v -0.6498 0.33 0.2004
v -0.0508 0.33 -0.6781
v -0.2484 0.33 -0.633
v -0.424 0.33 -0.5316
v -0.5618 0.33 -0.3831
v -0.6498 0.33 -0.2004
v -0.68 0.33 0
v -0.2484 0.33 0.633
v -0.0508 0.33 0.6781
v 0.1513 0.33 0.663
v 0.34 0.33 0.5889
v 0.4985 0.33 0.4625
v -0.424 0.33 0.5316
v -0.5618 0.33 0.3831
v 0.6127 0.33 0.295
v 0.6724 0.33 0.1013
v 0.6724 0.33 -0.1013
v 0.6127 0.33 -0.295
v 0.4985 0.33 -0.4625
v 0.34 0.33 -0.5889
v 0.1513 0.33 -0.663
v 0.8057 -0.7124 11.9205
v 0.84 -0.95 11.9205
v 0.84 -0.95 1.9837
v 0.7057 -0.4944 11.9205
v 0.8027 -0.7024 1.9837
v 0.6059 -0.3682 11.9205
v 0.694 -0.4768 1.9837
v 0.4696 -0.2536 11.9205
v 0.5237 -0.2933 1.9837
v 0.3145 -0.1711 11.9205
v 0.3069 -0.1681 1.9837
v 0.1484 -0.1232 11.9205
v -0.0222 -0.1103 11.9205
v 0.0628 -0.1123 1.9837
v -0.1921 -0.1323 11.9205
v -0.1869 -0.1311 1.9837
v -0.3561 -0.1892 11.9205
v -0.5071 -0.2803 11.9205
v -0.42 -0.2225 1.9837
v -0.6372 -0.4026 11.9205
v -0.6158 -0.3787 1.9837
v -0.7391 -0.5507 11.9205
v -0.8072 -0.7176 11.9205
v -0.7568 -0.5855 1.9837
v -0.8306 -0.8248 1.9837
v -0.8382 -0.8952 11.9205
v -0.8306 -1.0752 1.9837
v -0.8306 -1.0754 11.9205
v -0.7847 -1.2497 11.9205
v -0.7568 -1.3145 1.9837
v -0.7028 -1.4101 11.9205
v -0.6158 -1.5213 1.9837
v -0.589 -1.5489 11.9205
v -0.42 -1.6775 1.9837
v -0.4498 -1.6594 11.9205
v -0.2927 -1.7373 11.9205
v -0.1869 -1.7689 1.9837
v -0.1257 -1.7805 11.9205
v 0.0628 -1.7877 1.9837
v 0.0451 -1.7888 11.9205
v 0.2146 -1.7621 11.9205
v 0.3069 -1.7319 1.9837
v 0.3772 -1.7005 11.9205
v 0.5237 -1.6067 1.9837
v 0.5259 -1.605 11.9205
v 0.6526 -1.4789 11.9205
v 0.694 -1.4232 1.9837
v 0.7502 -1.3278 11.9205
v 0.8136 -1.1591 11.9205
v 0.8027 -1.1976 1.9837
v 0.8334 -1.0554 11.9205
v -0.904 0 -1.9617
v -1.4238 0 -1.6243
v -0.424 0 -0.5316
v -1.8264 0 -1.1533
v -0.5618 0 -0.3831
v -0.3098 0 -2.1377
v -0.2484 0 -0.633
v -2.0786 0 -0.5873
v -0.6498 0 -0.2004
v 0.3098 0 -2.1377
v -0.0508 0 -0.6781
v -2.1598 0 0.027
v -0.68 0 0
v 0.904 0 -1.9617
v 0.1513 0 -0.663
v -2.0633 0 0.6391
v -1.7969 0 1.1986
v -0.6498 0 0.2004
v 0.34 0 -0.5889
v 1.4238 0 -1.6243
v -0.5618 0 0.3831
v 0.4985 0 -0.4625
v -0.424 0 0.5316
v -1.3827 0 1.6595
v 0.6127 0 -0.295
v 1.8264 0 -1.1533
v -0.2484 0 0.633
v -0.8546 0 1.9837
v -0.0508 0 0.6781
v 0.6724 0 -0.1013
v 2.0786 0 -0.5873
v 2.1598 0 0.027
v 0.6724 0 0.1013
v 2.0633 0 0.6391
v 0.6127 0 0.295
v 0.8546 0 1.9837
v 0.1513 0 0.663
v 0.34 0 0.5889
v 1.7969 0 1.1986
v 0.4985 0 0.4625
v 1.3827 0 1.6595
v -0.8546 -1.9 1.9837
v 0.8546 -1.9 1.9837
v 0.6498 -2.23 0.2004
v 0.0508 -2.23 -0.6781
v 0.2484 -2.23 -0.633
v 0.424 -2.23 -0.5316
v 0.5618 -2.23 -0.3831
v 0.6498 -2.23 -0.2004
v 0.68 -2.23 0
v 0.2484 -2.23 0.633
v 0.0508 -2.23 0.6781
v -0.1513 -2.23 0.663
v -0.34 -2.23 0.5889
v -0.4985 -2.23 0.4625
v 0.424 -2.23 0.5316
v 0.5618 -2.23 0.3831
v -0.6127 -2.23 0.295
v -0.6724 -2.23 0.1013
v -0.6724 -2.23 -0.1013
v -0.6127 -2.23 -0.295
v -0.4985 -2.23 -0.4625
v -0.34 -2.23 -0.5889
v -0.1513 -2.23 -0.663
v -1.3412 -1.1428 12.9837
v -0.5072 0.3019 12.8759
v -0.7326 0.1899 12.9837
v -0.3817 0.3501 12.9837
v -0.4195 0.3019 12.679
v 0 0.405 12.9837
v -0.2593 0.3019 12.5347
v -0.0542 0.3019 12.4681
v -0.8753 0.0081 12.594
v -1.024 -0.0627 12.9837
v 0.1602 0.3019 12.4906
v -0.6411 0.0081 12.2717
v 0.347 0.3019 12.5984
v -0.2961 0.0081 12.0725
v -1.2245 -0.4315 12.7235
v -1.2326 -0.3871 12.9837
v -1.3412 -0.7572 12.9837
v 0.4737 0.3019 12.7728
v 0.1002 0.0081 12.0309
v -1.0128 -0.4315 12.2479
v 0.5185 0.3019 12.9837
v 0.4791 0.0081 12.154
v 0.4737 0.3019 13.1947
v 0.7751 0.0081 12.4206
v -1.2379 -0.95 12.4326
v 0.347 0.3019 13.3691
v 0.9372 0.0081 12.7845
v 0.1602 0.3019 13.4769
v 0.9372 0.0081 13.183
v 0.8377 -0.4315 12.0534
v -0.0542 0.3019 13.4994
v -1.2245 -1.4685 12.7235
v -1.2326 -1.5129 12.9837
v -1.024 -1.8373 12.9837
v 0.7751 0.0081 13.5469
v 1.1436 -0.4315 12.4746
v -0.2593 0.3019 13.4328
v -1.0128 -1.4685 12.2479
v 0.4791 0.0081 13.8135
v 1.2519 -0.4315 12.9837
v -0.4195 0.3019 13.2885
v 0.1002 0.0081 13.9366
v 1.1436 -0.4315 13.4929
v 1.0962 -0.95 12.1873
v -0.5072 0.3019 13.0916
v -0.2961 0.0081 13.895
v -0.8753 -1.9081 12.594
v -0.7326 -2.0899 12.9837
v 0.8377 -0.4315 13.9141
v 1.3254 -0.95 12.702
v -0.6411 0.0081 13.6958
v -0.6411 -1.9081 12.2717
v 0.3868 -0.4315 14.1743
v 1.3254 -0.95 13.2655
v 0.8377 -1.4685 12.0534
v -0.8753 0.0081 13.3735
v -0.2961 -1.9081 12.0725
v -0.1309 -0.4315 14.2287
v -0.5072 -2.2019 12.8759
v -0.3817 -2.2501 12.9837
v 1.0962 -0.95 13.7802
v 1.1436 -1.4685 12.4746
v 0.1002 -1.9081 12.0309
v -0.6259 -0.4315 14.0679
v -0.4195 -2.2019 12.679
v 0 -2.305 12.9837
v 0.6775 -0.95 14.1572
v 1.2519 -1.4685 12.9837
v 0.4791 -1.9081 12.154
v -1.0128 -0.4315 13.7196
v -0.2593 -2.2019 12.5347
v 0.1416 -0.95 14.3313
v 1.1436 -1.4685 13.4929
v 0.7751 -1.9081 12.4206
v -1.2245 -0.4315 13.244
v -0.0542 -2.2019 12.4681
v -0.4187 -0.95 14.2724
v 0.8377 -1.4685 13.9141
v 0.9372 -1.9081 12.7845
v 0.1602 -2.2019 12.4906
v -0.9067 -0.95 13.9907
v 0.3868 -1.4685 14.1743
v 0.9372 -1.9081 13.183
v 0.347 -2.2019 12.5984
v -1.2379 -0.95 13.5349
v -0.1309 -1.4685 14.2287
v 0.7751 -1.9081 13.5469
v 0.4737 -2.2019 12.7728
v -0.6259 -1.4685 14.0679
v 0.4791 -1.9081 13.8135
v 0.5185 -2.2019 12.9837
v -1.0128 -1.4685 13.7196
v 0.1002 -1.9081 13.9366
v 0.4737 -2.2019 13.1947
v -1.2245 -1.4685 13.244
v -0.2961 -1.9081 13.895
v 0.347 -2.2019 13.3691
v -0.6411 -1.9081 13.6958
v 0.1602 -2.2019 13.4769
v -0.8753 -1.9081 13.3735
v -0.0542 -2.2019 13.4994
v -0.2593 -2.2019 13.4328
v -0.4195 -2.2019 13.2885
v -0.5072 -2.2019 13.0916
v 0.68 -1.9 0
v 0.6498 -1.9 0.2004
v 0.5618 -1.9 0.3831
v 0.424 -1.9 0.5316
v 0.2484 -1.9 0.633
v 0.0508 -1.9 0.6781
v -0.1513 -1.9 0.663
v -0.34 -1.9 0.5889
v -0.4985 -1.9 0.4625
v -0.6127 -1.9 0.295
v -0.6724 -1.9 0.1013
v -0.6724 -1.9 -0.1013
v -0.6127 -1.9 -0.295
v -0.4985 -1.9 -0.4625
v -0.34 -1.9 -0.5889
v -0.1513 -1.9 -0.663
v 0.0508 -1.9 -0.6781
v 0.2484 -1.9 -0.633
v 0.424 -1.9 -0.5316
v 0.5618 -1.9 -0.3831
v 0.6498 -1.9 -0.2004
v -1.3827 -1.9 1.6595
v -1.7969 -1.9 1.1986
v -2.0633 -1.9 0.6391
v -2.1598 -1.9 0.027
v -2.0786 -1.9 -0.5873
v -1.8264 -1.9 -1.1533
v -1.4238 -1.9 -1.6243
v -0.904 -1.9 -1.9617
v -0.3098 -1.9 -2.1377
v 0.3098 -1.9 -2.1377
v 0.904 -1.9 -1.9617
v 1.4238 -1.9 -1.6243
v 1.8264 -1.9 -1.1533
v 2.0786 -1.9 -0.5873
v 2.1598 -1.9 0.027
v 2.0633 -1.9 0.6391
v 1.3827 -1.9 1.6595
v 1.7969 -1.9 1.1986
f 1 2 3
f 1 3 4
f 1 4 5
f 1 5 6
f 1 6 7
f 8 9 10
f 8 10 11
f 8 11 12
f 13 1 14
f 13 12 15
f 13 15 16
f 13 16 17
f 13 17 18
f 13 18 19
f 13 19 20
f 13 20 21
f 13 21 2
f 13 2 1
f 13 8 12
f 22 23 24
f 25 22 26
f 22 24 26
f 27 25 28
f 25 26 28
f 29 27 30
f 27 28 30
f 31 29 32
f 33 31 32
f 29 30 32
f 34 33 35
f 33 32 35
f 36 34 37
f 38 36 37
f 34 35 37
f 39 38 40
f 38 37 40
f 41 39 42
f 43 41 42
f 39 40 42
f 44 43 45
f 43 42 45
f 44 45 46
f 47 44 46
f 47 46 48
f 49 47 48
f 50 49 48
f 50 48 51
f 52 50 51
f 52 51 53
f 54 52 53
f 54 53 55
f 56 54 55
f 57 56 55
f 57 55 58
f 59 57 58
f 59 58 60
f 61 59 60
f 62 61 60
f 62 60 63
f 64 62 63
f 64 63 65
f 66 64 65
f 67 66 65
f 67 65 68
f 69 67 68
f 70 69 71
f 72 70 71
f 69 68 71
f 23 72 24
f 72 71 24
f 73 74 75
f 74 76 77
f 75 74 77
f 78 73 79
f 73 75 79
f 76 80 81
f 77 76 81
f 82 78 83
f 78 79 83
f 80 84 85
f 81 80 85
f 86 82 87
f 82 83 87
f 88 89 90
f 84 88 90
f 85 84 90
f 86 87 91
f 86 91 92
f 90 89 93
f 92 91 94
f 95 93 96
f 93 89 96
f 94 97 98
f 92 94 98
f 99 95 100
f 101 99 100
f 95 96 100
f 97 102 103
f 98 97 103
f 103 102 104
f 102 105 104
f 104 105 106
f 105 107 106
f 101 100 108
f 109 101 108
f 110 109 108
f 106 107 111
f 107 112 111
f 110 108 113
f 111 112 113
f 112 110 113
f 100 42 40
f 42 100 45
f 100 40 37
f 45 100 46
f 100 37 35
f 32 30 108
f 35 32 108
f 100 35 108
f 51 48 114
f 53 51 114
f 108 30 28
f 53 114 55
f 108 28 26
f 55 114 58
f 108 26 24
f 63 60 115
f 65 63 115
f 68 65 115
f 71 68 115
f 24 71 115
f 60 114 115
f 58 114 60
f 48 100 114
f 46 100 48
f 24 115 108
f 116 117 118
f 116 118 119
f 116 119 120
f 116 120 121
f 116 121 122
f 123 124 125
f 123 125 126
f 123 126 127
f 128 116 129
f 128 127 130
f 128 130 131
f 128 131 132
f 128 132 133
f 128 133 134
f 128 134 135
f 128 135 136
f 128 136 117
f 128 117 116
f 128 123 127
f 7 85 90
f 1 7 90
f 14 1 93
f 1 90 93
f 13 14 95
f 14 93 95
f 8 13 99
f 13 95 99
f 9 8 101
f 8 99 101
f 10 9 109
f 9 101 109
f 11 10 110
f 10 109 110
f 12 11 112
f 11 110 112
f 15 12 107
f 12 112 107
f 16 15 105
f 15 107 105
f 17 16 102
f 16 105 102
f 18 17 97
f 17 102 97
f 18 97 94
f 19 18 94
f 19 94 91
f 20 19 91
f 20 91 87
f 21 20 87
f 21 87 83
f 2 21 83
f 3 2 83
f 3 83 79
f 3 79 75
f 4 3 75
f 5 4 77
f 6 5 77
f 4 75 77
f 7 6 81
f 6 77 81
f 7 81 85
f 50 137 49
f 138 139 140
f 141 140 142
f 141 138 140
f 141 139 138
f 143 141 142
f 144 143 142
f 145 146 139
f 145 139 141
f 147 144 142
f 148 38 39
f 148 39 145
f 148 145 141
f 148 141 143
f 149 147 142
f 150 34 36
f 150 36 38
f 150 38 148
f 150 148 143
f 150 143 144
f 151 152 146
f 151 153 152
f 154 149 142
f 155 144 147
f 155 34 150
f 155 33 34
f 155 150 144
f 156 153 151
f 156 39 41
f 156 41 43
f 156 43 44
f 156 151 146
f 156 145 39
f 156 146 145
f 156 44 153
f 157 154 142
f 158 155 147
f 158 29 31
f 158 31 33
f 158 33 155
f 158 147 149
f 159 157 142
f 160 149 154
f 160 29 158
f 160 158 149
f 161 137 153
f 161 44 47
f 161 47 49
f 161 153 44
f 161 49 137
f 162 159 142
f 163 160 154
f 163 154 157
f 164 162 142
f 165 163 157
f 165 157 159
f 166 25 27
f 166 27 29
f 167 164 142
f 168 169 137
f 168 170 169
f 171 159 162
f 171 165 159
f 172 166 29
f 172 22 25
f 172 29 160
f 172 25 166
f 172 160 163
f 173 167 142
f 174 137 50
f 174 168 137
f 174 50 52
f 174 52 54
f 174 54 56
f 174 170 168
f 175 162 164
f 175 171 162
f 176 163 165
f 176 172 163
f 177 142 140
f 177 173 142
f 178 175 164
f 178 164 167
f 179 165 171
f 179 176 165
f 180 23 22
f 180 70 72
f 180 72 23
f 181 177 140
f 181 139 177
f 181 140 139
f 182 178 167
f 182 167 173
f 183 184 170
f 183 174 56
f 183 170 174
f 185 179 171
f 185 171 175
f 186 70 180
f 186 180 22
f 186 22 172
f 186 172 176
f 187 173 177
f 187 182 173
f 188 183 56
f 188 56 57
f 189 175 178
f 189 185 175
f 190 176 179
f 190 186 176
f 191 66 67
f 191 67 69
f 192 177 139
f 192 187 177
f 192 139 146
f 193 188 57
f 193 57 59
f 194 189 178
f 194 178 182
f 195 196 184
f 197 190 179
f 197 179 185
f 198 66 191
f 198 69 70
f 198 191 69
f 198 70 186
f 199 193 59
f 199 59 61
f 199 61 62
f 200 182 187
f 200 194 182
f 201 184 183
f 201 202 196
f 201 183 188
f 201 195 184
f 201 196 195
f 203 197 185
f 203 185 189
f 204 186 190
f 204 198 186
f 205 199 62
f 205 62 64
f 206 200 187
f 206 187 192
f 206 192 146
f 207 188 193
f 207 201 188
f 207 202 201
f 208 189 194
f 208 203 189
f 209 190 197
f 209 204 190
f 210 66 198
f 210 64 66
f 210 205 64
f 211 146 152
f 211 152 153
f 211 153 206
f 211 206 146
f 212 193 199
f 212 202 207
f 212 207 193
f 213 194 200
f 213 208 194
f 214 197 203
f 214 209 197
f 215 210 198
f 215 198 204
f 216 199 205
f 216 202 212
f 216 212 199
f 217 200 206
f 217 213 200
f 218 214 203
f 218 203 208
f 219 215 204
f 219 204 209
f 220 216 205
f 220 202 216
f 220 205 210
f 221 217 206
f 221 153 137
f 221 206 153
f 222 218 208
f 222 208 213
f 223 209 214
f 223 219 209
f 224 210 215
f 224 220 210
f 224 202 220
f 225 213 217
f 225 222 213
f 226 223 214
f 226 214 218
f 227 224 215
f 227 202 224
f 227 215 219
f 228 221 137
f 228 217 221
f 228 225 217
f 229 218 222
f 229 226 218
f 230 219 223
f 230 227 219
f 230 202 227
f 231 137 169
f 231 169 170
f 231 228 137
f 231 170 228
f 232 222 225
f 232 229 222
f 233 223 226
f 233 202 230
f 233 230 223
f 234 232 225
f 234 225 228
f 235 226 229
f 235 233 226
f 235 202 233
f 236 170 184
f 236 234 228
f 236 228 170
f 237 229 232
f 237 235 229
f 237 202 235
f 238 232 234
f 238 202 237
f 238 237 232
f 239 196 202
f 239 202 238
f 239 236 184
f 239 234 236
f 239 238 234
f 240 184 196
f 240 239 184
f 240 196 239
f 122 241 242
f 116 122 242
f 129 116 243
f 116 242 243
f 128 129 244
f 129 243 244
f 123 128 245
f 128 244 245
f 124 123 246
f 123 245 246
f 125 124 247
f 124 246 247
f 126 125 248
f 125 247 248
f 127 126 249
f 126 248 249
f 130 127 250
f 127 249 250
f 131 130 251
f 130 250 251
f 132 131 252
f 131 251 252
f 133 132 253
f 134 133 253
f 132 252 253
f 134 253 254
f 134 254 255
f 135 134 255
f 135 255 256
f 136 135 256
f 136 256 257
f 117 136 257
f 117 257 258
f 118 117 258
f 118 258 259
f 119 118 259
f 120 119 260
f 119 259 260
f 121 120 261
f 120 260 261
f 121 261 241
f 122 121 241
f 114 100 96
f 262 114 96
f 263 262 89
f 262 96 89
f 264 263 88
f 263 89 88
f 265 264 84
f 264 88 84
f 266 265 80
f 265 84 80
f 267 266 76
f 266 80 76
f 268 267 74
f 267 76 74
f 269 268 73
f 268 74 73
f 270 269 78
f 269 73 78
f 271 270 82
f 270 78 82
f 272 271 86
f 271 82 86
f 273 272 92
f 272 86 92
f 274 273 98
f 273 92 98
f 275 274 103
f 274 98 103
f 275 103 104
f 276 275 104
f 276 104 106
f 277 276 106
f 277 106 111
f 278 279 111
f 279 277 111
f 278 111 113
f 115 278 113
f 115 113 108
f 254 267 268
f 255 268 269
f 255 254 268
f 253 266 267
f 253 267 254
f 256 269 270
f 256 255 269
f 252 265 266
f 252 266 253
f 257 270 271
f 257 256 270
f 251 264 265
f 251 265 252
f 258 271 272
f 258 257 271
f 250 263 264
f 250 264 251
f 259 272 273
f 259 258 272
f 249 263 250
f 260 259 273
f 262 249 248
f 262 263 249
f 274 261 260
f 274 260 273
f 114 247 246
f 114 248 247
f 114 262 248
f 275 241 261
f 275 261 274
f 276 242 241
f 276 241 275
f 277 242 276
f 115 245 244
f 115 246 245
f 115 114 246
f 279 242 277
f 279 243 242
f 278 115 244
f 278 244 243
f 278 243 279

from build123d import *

# Parameters (mm, degrees)
F0_R     = 2.16
F1_DEPTH = 1.9
F3_R     = 0.68
F4_DEPTH = 0.33
F5_R     = 0.68
F6_DEPTH = 0.33
F7_DEPTH = 25
F8_R     = 0.84
F9_DEPTH = 11


with BuildPart() as f1:
    # F0 (on Front) → F1 (new body)
    with BuildSketch(Plane.XZ):
        Circle(F0_R)
    extrude(amount=F1_DEPTH)

    # F3 (on face) → F4 (join)
    with BuildSketch(Plane.XZ.offset(1.9)):
        Circle(F3_R)
    extrude(amount=F4_DEPTH)

    # F5 (on face) → F6 (join)
    with BuildSketch(Plane(origin=(0, 0, 0), x_dir=(-1, 0, 0), z_dir=(0, 1, 0))):
        Circle(F5_R)
    extrude(amount=F6_DEPTH)

    # F2 (on face) → F7 (cut)
    with BuildSketch(Plane.XZ.offset(1.9)):
        with BuildLine():
            ThreePointArc((0.854606, 1.983746), (0, 2.16), (-0.854606, 1.983746))
            Line((-0.854606, 1.983746), (0.854606, 1.983746))
        make_face()
    extrude(amount=-F7_DEPTH, mode=Mode.SUBTRACT)

    # F8 (on face) → F9 (join)
    with BuildSketch(Plane.XY.offset(1.983746)):
        with Locations((0, -0.95)):
            Circle(F8_R)
    extrude(amount=F9_DEPTH)

    # F10 (on face) → F11 (revolve)
    with BuildSketch(Plane.XY.offset(12.983746)):
        with BuildLine():
            Line((0, -2.305), (0, 0.405))
            ThreePointArc((0, 0.405), (-1.355, -0.95), (0, -2.305))
        make_face()
        with BuildLine():
            Line((0, -0.11), (0, 0.405))
            ThreePointArc((0, 0.405), (-1.355, -0.95), (0, -2.305))
            Line((0, -2.305), (0, -1.79))
            ThreePointArc((0, -1.79), (-0.84, -0.95), (0, -0.11))
        make_face()
    revolve(axis=Axis((0, -0.95, 12.983746), (0, -1, 0)))


solid = f1.part
